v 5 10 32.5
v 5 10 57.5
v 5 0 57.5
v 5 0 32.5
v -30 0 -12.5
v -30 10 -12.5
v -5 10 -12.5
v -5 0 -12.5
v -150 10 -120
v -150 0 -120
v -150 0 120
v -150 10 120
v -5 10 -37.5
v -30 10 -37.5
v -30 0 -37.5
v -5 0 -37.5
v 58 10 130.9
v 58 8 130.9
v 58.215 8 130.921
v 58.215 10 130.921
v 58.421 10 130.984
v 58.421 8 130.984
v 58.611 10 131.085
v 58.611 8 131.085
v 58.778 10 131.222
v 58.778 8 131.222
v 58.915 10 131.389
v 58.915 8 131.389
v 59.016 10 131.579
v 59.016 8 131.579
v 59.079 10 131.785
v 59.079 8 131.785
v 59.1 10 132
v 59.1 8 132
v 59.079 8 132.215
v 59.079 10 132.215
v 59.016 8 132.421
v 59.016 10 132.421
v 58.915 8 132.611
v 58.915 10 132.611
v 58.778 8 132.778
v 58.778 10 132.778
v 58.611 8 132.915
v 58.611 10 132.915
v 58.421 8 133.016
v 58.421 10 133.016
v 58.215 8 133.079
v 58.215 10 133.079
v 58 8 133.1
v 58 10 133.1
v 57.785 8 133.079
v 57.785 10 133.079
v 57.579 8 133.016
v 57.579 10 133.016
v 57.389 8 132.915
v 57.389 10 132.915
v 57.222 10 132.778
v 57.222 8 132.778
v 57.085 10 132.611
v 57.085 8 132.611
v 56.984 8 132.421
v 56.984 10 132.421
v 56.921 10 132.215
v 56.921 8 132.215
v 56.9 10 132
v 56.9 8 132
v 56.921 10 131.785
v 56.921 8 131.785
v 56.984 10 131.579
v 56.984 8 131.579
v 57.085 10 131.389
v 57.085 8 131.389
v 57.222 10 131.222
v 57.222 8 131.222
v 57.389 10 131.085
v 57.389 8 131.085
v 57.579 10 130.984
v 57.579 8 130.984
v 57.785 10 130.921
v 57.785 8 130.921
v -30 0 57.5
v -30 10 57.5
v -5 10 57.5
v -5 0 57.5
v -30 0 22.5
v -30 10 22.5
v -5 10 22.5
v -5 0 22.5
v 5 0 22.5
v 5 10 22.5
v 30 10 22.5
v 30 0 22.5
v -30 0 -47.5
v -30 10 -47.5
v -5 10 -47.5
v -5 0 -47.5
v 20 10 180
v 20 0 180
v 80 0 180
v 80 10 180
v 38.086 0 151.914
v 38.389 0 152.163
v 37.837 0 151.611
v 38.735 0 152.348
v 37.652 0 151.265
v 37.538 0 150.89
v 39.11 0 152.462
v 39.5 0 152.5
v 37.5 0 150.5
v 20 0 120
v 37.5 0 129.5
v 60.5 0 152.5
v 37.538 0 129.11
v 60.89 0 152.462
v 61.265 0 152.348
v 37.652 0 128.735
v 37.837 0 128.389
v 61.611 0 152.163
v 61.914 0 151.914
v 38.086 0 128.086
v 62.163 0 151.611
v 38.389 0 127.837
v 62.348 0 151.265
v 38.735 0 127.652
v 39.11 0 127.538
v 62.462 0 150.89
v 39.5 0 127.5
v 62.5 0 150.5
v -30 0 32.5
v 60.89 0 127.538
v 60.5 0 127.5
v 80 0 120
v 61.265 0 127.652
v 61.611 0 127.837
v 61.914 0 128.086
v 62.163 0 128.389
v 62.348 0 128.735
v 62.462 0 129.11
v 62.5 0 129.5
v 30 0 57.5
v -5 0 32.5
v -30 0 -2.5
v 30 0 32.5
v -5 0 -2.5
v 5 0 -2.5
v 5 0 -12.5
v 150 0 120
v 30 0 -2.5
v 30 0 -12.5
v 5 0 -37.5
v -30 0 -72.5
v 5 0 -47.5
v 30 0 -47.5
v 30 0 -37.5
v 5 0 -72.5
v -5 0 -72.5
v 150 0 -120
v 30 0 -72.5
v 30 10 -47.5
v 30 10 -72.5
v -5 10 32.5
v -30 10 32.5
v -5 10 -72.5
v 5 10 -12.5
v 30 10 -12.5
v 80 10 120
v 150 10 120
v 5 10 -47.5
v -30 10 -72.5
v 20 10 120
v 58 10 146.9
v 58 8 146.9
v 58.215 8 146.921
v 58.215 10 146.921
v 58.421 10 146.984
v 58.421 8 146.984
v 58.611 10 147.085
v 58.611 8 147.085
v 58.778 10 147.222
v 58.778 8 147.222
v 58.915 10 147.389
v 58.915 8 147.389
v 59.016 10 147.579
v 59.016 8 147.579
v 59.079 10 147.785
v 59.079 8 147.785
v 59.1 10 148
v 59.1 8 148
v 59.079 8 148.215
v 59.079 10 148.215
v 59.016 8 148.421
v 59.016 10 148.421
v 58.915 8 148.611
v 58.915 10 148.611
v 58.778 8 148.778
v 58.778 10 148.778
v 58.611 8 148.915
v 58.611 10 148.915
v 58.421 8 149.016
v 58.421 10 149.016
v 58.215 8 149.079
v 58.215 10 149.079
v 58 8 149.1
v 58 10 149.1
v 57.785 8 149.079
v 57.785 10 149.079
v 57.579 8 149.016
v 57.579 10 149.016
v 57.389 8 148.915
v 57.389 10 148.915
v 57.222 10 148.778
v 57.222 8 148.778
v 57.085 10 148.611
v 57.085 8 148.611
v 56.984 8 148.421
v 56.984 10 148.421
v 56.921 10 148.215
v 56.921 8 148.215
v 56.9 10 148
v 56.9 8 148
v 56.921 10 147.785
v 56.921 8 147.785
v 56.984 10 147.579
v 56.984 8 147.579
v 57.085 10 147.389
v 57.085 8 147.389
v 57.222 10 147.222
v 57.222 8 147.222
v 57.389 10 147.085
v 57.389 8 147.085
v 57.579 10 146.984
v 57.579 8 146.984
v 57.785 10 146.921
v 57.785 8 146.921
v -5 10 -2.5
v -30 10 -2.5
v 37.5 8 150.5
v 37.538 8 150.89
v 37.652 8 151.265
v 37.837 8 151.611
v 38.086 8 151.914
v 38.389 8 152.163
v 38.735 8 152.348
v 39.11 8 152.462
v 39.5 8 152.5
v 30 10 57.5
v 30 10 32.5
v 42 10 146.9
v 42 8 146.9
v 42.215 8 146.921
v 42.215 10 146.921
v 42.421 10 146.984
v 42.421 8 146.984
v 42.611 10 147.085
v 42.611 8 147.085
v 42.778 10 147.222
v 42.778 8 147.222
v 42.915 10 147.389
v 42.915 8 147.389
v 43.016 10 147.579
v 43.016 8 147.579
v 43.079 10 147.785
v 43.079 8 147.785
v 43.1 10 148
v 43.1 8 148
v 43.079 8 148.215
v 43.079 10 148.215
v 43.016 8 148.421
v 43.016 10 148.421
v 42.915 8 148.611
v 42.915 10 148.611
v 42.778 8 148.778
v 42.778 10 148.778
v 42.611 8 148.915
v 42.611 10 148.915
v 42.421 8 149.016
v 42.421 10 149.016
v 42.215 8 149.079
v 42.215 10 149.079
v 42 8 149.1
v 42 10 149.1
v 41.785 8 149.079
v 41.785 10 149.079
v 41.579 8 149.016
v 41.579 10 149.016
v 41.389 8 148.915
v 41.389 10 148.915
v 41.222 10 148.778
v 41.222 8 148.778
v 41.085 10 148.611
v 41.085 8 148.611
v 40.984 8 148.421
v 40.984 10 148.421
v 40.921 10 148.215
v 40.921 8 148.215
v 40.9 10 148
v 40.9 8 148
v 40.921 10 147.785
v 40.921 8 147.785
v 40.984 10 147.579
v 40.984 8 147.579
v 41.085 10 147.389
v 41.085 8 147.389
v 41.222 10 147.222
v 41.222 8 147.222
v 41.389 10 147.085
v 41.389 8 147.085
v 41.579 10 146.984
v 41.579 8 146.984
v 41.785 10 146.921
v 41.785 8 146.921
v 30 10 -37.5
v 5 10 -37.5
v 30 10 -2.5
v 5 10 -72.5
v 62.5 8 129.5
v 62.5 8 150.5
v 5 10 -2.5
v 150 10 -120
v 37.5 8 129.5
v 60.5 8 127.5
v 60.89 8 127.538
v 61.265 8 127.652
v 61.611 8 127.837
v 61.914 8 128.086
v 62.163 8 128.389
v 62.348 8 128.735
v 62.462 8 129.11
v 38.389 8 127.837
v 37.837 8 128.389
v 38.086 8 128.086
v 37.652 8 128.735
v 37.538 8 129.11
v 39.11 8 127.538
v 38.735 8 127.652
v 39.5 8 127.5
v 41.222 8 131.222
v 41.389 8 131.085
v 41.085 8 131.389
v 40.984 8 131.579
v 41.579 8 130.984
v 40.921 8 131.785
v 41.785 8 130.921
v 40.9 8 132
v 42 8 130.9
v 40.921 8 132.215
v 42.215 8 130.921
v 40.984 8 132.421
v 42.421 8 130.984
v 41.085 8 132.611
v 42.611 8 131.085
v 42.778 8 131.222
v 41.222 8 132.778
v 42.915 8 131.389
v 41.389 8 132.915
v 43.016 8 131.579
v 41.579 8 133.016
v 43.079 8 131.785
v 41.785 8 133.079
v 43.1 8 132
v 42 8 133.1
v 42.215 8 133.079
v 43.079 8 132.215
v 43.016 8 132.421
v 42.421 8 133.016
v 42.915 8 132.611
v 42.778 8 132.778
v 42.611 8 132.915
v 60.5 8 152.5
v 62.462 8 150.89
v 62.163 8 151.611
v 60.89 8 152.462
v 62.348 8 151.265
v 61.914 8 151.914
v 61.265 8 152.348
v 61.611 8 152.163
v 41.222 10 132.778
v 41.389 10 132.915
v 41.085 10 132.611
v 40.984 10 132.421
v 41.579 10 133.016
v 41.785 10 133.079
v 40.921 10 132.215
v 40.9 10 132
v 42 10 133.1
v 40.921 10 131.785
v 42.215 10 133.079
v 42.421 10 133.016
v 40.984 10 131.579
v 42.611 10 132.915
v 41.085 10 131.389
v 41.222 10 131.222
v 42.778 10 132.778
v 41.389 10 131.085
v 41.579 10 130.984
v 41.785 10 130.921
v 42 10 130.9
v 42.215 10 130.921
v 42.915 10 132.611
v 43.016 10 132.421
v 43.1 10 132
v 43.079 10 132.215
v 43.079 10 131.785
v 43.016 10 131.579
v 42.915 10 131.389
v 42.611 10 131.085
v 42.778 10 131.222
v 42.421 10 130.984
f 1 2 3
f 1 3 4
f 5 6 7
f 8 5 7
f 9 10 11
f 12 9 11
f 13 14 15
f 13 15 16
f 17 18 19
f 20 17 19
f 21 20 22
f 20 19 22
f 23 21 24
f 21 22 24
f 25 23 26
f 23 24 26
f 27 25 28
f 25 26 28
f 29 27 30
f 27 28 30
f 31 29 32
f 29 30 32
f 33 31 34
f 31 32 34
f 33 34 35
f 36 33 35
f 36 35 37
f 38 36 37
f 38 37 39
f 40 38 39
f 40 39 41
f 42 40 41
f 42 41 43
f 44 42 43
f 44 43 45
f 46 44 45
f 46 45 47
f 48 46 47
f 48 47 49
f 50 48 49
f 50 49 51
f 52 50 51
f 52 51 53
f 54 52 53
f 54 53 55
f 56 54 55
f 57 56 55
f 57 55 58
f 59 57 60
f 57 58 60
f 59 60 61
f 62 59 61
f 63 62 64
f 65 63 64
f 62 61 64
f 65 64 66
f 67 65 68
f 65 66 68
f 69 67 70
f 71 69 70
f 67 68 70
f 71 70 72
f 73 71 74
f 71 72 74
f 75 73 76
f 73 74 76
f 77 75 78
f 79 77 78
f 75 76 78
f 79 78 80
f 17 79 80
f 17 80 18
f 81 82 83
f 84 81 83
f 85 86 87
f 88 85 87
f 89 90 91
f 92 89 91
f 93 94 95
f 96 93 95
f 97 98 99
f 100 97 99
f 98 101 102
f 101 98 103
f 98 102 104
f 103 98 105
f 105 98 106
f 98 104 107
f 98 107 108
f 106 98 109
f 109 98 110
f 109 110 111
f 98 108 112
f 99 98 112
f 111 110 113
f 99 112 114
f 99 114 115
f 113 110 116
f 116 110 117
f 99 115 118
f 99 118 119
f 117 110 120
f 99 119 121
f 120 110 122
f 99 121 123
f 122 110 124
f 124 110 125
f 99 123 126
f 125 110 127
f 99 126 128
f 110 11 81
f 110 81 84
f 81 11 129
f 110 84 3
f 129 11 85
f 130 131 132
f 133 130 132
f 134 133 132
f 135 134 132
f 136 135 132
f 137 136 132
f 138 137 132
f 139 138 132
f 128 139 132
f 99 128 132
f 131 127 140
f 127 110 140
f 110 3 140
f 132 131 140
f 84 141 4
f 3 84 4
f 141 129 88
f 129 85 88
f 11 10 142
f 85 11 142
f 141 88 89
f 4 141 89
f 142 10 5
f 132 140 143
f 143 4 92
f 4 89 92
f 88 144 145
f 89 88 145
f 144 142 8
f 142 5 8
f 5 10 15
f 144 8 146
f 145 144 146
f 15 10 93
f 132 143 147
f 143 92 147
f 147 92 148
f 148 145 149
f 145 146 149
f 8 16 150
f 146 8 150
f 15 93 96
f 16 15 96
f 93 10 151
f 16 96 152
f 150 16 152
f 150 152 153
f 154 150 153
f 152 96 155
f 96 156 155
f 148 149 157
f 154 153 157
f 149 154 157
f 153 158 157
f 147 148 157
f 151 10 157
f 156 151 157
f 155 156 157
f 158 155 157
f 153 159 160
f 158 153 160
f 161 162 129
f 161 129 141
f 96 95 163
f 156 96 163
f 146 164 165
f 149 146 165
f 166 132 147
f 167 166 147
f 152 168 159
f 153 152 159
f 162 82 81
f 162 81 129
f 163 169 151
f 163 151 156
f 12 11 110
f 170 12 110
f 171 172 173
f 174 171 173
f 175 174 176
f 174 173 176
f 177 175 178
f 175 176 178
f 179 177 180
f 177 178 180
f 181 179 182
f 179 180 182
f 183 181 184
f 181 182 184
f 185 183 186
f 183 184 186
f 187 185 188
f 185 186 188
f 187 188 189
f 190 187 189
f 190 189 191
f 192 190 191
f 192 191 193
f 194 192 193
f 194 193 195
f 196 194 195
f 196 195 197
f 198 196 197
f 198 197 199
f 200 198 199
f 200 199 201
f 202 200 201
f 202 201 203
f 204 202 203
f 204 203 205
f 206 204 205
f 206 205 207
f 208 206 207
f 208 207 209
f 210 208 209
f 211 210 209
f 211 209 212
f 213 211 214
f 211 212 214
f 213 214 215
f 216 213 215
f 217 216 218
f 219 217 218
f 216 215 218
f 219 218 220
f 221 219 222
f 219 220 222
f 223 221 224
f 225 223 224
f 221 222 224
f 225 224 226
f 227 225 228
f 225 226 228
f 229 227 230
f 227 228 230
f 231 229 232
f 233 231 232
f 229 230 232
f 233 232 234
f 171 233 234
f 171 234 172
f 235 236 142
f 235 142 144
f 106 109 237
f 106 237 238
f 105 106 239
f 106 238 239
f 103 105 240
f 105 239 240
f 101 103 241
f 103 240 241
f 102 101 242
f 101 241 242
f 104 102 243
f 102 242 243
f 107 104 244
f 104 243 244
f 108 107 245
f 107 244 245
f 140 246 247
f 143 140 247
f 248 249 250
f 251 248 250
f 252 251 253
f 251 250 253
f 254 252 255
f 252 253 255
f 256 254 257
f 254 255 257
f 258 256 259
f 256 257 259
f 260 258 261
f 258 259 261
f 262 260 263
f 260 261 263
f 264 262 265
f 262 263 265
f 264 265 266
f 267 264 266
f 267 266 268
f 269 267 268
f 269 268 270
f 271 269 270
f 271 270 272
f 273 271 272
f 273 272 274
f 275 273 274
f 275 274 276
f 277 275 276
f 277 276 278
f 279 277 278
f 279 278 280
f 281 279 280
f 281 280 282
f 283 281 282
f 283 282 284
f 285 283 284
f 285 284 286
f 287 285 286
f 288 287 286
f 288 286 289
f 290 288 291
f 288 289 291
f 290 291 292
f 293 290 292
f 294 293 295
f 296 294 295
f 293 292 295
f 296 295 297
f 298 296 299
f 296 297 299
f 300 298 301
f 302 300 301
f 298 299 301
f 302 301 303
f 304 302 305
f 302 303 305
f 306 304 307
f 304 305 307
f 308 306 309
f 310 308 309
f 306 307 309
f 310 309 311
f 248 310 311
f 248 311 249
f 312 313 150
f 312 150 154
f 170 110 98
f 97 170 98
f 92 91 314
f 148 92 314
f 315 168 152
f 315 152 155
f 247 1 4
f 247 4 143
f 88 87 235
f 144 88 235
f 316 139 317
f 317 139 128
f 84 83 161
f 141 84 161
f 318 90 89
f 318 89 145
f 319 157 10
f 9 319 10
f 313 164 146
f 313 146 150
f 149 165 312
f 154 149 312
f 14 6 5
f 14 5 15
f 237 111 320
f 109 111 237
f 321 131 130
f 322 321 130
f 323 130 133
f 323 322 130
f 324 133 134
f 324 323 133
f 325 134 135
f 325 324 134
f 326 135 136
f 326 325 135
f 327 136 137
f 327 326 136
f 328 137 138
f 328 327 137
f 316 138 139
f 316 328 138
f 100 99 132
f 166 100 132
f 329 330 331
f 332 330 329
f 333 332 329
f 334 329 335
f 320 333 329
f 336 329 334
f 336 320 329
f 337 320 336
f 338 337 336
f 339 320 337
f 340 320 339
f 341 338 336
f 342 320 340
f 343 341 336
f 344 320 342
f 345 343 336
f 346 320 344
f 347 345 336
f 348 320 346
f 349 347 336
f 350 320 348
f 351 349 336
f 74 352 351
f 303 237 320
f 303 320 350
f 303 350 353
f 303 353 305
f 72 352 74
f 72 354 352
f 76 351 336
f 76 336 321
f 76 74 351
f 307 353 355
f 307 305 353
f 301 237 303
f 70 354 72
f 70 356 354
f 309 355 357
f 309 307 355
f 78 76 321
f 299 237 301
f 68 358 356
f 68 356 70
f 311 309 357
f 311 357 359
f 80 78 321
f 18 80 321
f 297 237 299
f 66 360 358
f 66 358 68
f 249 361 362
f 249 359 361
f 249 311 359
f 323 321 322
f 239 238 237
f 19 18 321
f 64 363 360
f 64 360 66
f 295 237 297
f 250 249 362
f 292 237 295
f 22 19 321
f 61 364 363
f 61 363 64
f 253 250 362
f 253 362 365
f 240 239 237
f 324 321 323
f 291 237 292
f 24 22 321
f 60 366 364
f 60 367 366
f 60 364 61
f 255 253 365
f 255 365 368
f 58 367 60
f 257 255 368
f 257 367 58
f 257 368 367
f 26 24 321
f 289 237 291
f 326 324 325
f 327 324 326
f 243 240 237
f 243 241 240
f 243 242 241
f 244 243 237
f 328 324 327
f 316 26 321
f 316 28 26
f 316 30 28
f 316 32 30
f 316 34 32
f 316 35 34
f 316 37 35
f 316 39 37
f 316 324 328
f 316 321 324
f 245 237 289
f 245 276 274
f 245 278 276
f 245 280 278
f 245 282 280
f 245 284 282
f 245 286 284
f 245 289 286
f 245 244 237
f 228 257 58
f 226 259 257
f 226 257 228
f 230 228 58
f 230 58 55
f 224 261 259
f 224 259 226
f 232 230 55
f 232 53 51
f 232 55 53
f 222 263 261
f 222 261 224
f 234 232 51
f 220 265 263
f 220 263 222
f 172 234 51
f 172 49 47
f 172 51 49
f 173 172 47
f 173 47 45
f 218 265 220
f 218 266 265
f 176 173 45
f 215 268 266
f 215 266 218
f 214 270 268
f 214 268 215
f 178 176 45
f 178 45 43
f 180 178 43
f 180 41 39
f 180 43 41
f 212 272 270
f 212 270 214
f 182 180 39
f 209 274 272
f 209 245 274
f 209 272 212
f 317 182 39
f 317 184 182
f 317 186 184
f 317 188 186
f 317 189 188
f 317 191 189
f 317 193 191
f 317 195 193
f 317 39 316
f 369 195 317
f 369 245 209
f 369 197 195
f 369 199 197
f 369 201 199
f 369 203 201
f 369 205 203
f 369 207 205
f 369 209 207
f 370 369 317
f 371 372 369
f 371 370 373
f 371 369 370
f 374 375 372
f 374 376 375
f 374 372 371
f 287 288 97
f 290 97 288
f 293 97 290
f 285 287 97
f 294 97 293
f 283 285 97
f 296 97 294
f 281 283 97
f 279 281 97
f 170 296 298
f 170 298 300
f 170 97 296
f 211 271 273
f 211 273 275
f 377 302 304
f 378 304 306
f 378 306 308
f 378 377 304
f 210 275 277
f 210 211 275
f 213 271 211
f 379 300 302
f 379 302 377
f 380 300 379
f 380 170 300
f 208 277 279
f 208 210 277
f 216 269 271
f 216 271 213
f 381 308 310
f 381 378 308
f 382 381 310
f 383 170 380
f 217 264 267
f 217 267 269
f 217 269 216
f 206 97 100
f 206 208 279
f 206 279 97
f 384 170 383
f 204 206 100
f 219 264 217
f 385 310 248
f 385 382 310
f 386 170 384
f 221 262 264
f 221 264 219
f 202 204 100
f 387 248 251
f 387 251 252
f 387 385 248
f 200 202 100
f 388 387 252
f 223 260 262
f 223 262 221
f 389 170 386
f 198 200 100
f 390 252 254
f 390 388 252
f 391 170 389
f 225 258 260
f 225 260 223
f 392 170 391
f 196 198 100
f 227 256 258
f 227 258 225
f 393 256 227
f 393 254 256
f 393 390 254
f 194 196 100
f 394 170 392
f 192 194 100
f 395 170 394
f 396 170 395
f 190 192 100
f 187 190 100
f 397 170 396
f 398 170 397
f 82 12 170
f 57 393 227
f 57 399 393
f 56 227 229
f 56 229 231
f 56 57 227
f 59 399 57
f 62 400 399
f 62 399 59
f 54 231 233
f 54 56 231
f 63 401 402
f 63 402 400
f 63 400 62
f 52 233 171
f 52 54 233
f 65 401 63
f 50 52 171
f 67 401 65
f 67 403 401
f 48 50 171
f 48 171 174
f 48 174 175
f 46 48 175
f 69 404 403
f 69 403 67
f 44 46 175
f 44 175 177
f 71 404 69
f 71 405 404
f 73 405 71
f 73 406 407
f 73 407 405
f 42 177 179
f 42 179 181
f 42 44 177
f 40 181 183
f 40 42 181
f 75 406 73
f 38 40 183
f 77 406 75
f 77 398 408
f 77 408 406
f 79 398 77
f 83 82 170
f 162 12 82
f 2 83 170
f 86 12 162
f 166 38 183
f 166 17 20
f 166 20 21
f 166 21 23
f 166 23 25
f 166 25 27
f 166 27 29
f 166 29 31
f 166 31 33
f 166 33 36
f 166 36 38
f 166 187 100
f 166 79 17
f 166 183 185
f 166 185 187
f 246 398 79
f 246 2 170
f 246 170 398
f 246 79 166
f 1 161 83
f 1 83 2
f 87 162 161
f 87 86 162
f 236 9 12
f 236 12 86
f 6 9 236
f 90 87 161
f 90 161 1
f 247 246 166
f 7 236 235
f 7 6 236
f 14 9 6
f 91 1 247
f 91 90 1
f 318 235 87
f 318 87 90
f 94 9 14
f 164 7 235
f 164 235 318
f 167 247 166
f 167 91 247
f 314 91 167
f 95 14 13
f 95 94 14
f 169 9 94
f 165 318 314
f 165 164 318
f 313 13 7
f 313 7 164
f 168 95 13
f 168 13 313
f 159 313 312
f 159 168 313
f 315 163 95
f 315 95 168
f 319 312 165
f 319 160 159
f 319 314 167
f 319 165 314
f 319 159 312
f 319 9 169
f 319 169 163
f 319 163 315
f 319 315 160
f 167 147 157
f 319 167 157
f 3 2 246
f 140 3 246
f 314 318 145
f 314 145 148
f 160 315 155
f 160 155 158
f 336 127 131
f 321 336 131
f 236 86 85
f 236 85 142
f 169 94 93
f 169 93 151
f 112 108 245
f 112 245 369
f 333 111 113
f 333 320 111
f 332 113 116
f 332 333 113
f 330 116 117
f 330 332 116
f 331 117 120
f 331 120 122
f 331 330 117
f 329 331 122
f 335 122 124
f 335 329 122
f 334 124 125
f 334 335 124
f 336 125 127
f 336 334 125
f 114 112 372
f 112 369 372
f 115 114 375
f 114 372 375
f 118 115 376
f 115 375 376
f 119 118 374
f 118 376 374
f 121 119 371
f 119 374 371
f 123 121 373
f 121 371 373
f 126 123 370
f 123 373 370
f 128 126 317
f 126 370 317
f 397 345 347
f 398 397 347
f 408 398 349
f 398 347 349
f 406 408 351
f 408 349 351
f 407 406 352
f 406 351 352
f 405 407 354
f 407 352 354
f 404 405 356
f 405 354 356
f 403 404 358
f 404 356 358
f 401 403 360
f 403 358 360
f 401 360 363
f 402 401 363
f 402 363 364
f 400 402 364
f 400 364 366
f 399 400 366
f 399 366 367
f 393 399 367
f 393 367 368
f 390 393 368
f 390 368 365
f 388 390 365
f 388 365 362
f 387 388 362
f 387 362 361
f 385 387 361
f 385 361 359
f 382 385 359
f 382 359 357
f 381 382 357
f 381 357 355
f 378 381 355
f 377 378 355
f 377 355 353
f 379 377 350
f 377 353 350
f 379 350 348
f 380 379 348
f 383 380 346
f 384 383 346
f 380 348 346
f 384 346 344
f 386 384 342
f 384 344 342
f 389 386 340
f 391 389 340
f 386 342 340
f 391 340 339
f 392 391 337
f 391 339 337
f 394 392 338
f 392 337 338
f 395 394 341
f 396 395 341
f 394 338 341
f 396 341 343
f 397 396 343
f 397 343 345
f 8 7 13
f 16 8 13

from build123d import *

# Parameters (mm, degrees)
EXTRUDE_1_DEPTH     = 10
SKETCH_2_W          = 25
SKETCH_2_H          = 25
SKETCH_2_R          = 1.1
CUT_EXTRUDE_1_DEPTH = 8
SKETCH_2_3_R        = 1.1
CUT_EXTRUDE_2_DEPTH = 235.520787991
SKETCH_3_W          = 25
SKETCH_3_H          = 25
CUT_EXTRUDE_3_DEPTH = 235.520787991
FILLET_2_R          = 2


with BuildPart() as part:
    # 草圖1 → 填料-伸長1 (new body)
    with BuildSketch(Plane(origin=(0, 0, 0), x_dir=(1, 0, 0), z_dir=(0, 1, 0))):
        Polygon((-150, -120), (20, -120), (20, -180), (80, -180), (80, -120), (150, -120), (150, 120), (-150, 120), align=None)
    extrude(amount=EXTRUDE_1_DEPTH)

    # 草圖2 → 除料-伸長1 (cut)
    with BuildSketch(Plane.XZ):
        with Locations((50, 140)):
            Rectangle(SKETCH_2_W, SKETCH_2_H)
        with Locations((42, 132)):
            Circle(SKETCH_2_R, mode=Mode.SUBTRACT)
        with Locations((58, 132)):
            Circle(SKETCH_2_R, mode=Mode.SUBTRACT)
        with Locations((42, 148)):
            Circle(SKETCH_2_R, mode=Mode.SUBTRACT)
        with Locations((58, 148)):
            Circle(SKETCH_2_R, mode=Mode.SUBTRACT)
    extrude(amount=-CUT_EXTRUDE_1_DEPTH, mode=Mode.SUBTRACT)

    # 草圖2<3> → 除料-伸長2 (cut, through all)
    with BuildSketch(Plane.XZ):
        with Locations((42, 132)):
            Circle(SKETCH_2_3_R)
        with Locations((42, 148)):
            Circle(SKETCH_2_3_R)
        with Locations((58, 132)):
            Circle(SKETCH_2_3_R)
        with Locations((58, 148)):
            Circle(SKETCH_2_3_R)
    extrude(amount=-CUT_EXTRUDE_2_DEPTH, mode=Mode.SUBTRACT)

    # 草圖3 → 除料-伸長3 (cut, through all)
    with BuildSketch(Plane(origin=(0, 10, 0), x_dir=(1, 0, 0), z_dir=(0, 1, 0))):
        with Locations((-17.5, 25)):
            Rectangle(SKETCH_3_W, SKETCH_3_H)
        with Locations((-17.5, -45)):
            Rectangle(SKETCH_3_W, SKETCH_3_H)
        with Locations((-17.5, 60)):
            Rectangle(SKETCH_3_W, SKETCH_3_H)
        with Locations((-17.5, -10)):
            Rectangle(SKETCH_3_W, SKETCH_3_H)
        with Locations((17.5, -45)):
            Rectangle(SKETCH_3_W, SKETCH_3_H)
        with Locations((17.5, -10)):
            Rectangle(SKETCH_3_W, SKETCH_3_H)
        with Locations((17.5, 25)):
            Rectangle(SKETCH_3_W, SKETCH_3_H)
        with Locations((17.5, 60)):
            Rectangle(SKETCH_3_W, SKETCH_3_H)
    extrude(amount=-CUT_EXTRUDE_3_DEPTH, mode=Mode.SUBTRACT)

    # 圓角2
    fillet_2_edges = [part.edges().sort_by_distance(p)[0] for p in [
        (37.5, 4, 152.5),
        (62.5, 4, 127.5),
        (62.5, 4, 152.5),
        (37.5, 4, 127.5),
    ]]
    fillet(fillet_2_edges, radius=FILLET_2_R)


solid = part.part
